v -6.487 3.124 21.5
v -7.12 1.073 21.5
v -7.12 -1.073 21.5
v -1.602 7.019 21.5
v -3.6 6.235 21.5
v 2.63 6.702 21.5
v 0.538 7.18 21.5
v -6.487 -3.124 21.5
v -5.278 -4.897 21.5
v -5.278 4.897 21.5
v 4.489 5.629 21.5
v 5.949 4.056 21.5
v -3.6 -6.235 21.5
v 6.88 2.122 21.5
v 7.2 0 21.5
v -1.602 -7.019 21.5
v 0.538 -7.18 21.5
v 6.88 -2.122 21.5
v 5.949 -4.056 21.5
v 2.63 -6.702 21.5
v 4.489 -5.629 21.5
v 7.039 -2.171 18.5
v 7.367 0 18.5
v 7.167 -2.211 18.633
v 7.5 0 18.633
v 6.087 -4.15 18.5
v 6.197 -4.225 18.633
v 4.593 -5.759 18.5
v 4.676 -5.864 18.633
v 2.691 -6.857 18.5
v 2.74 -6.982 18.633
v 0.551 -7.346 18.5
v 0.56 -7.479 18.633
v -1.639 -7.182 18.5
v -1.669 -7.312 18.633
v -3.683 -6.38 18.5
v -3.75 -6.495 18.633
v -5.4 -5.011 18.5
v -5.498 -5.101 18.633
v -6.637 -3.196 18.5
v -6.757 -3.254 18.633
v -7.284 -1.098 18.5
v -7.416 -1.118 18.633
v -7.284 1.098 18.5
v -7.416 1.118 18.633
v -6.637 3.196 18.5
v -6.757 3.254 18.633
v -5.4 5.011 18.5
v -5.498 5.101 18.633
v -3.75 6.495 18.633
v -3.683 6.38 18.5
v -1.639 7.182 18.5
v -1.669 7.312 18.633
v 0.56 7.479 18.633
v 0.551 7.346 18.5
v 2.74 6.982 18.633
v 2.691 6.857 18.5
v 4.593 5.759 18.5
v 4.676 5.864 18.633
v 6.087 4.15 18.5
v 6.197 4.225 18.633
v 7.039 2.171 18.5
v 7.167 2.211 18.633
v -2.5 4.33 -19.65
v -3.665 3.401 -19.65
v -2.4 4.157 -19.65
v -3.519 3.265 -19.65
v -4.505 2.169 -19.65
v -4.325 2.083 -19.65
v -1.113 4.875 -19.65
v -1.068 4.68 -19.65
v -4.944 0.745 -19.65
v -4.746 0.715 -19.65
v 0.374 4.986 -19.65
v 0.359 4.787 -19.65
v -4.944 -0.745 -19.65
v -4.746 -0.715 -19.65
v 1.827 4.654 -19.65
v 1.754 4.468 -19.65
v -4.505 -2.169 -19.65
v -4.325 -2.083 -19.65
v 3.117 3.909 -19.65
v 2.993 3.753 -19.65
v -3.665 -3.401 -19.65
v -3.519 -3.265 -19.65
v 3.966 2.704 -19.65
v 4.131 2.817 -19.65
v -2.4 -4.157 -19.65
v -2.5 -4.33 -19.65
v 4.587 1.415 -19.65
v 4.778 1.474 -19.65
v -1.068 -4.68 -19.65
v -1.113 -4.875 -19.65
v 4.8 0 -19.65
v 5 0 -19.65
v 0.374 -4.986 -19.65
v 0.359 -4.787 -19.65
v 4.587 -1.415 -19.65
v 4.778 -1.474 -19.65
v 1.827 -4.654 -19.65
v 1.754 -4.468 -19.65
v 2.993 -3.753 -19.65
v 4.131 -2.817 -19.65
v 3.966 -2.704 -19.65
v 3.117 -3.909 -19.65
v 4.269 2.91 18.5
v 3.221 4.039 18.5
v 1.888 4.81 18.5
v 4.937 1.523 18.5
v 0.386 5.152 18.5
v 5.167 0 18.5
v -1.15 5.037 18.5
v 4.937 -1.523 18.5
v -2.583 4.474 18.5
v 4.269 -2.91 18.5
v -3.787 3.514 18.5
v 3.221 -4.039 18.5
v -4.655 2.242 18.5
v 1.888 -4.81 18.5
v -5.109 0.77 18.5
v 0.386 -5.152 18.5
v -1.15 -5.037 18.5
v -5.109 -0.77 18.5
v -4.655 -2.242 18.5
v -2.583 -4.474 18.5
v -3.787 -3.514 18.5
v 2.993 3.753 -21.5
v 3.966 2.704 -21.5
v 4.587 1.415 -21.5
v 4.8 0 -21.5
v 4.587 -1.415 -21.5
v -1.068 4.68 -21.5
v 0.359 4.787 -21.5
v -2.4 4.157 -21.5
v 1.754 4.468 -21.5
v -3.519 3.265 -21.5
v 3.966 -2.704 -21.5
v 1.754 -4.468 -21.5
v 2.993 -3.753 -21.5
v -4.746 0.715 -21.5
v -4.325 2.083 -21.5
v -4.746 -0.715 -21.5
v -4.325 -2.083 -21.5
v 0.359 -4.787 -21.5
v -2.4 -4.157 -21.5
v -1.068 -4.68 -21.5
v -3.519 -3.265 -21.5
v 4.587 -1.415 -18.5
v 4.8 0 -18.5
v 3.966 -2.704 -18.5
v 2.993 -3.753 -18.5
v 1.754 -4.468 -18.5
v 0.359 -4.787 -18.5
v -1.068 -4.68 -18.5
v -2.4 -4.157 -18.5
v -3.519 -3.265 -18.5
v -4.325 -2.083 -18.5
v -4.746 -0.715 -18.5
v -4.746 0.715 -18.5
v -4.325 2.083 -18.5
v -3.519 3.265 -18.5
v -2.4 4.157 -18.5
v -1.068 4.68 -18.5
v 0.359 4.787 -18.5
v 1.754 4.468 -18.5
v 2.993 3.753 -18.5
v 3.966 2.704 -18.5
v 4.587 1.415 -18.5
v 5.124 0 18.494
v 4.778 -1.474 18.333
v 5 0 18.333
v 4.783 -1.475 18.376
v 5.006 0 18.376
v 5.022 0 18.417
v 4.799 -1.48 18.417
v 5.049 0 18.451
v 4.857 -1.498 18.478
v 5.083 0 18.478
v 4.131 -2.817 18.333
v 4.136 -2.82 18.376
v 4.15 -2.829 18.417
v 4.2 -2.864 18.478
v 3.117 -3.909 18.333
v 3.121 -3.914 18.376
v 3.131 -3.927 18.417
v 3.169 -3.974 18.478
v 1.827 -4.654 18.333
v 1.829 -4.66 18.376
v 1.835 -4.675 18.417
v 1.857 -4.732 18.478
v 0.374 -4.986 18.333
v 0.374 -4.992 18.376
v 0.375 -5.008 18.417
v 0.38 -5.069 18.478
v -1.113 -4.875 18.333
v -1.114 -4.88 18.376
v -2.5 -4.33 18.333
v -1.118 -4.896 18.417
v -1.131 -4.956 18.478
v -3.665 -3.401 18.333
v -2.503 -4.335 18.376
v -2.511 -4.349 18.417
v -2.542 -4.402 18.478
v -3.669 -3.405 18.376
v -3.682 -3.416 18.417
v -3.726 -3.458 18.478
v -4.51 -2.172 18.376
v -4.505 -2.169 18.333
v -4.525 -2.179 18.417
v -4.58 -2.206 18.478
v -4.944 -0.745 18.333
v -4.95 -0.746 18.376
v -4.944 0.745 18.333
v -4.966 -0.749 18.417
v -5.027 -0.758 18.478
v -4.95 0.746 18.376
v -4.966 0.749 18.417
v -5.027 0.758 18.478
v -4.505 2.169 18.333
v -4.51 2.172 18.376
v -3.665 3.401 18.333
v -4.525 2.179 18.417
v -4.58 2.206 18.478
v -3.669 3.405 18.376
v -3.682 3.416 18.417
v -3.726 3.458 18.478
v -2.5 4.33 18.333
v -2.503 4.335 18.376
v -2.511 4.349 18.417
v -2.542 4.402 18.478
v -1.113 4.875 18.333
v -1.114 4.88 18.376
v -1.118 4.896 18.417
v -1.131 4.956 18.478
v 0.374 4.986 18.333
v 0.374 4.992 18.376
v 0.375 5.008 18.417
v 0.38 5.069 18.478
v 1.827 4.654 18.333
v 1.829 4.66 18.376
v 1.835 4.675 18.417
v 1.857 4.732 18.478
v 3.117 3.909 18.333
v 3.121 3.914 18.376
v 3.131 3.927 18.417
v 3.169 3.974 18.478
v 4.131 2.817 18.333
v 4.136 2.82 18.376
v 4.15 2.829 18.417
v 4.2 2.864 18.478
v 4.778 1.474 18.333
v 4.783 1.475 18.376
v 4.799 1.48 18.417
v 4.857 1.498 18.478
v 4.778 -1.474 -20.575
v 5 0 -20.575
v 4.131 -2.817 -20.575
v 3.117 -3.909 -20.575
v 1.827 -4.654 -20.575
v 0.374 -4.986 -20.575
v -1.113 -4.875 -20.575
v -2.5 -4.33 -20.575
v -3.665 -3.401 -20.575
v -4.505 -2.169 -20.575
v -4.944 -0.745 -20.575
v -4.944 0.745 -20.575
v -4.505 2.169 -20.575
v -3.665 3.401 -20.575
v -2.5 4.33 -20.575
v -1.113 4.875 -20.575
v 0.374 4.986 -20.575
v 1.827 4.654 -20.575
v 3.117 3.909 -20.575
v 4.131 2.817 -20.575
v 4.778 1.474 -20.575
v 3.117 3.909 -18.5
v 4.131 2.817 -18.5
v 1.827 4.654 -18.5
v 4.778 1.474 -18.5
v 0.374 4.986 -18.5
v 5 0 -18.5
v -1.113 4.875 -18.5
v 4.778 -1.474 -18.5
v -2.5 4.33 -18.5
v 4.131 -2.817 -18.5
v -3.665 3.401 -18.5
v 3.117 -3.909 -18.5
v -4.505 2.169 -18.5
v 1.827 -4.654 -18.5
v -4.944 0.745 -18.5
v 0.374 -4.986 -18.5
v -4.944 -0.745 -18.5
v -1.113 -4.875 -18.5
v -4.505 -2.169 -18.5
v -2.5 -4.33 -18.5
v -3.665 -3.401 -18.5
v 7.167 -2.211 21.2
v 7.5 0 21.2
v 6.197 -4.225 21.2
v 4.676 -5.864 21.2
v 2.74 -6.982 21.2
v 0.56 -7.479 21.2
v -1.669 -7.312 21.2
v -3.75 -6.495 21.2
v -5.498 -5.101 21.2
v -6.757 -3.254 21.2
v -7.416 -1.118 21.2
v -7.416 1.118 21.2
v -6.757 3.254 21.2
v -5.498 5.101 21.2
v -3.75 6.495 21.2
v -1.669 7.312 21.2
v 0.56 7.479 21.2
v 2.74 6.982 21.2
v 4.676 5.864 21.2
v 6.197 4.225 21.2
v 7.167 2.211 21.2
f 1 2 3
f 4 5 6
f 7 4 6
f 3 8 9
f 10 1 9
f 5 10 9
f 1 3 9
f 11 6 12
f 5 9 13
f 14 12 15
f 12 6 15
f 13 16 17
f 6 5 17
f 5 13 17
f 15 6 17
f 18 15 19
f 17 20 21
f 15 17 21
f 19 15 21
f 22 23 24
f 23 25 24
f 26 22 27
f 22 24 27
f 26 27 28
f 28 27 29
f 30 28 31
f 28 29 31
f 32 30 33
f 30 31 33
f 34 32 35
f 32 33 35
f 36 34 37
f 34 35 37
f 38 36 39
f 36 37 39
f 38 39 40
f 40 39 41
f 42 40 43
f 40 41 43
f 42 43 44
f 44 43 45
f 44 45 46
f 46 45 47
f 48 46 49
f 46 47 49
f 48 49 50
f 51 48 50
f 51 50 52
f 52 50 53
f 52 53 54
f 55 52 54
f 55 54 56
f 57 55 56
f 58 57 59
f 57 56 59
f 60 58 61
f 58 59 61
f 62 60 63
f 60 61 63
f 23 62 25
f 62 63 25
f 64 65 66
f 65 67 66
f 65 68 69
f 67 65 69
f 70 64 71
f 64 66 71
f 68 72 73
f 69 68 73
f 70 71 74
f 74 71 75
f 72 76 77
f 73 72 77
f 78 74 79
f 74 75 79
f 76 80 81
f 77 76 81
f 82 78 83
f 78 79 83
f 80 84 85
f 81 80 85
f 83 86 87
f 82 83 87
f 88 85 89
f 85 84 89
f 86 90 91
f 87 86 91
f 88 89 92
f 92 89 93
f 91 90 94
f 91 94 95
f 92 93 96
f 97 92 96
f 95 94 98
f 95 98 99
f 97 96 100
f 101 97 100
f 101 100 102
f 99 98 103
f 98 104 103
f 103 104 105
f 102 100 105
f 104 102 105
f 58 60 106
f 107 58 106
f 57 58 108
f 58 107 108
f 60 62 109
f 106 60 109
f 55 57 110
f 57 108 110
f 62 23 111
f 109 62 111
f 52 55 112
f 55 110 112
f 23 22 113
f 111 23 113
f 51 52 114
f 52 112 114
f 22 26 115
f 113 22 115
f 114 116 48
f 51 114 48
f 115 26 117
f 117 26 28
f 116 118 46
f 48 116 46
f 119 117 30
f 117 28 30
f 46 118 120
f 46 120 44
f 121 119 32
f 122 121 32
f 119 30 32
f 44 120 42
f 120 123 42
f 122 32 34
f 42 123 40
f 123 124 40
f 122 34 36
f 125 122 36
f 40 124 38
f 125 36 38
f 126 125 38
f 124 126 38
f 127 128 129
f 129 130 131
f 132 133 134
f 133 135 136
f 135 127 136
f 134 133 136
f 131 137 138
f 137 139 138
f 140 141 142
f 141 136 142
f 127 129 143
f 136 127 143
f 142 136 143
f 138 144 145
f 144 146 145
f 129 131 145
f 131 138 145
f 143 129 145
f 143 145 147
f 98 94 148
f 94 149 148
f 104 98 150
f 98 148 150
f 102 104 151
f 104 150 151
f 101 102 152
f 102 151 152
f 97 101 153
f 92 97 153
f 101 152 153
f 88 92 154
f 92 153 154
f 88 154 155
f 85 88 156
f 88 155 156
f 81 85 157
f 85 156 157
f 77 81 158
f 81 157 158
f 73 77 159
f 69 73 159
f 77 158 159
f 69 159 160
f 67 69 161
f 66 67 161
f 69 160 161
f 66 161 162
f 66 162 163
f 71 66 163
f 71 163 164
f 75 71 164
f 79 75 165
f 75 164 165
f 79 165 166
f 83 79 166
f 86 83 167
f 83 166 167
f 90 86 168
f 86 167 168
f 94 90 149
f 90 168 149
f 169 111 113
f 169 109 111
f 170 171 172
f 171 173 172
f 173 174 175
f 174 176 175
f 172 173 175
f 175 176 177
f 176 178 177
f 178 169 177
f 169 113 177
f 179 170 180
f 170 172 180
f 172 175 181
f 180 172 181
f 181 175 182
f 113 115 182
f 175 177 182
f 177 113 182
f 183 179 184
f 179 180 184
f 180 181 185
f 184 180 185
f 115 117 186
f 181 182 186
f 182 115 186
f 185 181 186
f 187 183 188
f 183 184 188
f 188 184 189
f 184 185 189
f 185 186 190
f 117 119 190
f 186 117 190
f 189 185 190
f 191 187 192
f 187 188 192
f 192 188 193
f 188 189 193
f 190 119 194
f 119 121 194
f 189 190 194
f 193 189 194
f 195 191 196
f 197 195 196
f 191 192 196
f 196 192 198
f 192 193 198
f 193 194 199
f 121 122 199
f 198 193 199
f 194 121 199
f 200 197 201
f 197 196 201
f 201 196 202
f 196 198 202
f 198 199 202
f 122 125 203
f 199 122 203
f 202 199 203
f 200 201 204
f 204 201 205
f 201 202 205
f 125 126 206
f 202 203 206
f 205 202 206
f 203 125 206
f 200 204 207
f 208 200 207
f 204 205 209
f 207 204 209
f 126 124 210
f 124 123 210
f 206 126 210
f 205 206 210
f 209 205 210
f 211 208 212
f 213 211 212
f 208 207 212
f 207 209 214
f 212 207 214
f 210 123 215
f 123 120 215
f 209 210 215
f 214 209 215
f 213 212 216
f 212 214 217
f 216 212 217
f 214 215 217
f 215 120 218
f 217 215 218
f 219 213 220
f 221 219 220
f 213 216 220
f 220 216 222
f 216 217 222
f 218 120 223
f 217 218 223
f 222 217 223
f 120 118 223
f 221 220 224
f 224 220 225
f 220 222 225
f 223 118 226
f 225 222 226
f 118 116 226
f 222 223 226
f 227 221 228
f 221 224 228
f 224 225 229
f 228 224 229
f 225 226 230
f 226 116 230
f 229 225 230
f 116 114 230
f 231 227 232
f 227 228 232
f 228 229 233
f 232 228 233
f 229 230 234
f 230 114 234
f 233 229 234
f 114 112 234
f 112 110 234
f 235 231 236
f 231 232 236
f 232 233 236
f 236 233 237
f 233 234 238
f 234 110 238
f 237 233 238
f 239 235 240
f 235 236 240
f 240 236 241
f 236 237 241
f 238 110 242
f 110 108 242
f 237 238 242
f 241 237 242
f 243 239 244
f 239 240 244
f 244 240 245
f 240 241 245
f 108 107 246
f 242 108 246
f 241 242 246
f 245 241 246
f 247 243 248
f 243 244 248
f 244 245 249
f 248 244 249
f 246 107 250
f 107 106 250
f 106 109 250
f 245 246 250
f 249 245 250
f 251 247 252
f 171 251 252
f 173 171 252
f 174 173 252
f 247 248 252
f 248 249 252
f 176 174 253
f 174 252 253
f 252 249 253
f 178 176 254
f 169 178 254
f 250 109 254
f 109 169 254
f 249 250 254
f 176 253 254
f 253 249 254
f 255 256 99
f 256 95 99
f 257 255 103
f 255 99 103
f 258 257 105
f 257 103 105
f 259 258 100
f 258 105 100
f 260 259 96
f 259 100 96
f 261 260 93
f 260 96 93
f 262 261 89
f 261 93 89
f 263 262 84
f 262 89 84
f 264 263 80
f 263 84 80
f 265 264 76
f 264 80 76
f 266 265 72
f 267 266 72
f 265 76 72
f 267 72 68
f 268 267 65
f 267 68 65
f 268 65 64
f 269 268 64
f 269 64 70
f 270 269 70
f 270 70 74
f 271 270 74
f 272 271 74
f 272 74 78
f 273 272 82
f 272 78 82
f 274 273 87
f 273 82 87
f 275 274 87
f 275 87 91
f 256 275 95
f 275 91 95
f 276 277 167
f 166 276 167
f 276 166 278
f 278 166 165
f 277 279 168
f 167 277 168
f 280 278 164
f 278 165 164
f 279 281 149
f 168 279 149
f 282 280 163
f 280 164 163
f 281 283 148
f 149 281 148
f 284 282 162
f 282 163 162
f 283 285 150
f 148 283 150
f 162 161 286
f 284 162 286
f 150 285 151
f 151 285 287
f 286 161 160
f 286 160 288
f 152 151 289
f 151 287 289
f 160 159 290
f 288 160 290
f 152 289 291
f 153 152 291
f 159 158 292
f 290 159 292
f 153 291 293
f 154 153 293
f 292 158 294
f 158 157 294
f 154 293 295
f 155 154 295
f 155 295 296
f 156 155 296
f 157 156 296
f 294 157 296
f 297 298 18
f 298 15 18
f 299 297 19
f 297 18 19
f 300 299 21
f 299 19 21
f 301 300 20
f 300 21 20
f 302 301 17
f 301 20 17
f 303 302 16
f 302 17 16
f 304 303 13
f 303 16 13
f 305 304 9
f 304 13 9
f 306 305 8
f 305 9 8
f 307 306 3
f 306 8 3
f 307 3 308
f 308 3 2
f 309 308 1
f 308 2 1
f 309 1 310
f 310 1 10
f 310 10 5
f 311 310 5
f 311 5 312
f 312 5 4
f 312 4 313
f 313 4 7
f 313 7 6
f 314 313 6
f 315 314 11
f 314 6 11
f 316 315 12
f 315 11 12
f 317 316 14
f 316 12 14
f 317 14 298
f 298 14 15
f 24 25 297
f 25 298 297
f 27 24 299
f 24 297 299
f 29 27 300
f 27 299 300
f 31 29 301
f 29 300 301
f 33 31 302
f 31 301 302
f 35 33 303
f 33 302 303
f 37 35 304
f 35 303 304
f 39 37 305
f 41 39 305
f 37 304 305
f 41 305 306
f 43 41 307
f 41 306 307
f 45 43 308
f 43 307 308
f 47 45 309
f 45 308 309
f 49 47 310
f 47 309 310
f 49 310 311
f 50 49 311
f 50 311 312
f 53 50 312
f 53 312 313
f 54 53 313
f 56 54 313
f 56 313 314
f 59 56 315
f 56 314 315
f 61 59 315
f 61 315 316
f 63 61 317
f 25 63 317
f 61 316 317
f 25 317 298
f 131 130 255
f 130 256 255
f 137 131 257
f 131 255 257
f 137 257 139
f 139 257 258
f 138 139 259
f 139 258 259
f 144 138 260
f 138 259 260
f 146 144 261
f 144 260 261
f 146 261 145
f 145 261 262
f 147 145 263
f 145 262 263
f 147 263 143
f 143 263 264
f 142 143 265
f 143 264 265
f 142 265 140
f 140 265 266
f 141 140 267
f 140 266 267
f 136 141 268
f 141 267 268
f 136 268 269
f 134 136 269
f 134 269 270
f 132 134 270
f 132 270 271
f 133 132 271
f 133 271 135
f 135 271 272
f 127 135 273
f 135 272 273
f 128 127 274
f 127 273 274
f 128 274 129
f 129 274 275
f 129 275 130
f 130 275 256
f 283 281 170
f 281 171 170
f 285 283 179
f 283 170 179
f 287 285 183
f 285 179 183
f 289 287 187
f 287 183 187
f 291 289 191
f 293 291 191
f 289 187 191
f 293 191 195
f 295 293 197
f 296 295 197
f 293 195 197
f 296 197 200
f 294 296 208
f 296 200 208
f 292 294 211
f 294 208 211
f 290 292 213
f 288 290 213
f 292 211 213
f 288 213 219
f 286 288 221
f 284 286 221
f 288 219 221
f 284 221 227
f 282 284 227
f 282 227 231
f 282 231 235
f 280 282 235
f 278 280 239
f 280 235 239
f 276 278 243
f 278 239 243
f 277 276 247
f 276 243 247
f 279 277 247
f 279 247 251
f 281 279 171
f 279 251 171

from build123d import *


with BuildPart() as part:
    # 草图3 → 旋转1 (revolve)
    with BuildSketch(Plane(origin=(0, 0, 0), x_dir=(0, 0, -1), z_dir=(1, 0, 0)), mode=Mode.PRIVATE) as revolve_1_sk:
        with BuildLine():
            Line((18.5, 0), (21.5, 0))
            Line((21.5, 0), (21.5, 4.8))
            Line((21.5, 4.8), (20.575, 5))
            Line((20.575, 5), (19.65, 5))
            Line((19.65, 5), (19.65, 4.8))
            Line((19.65, 4.8), (18.5, 4.8))
            Line((18.5, 4.8), (18.5, 5))
            Line((18.5, 5), (0, 5))
            Line((0, 5), (-18.333333333, 5))
            ThreePointArc((-18.333333333, 5), (-18.451184464, 5.048815536), (-18.5, 5.166666667))
            Line((-18.5, 5.166666667), (-18.5, 7.366666667))
            Line((-18.5, 7.366666667), (-18.633333333, 7.5))
            Line((-18.633333333, 7.5), (-21.2, 7.5))
            Line((-21.2, 7.5), (-21.5, 7.2))
            Line((-21.5, 7.2), (-21.5, 0))
            Line((-21.5, 0), (18.5, 0))
        make_face()
    revolve(revolve_1_sk.sketch.rotate(Axis((0, 0, 21.5), (0, 0, -1)), 90), axis=Axis((0, 0, 21.5), (0, 0, -1)))


solid = part.part
